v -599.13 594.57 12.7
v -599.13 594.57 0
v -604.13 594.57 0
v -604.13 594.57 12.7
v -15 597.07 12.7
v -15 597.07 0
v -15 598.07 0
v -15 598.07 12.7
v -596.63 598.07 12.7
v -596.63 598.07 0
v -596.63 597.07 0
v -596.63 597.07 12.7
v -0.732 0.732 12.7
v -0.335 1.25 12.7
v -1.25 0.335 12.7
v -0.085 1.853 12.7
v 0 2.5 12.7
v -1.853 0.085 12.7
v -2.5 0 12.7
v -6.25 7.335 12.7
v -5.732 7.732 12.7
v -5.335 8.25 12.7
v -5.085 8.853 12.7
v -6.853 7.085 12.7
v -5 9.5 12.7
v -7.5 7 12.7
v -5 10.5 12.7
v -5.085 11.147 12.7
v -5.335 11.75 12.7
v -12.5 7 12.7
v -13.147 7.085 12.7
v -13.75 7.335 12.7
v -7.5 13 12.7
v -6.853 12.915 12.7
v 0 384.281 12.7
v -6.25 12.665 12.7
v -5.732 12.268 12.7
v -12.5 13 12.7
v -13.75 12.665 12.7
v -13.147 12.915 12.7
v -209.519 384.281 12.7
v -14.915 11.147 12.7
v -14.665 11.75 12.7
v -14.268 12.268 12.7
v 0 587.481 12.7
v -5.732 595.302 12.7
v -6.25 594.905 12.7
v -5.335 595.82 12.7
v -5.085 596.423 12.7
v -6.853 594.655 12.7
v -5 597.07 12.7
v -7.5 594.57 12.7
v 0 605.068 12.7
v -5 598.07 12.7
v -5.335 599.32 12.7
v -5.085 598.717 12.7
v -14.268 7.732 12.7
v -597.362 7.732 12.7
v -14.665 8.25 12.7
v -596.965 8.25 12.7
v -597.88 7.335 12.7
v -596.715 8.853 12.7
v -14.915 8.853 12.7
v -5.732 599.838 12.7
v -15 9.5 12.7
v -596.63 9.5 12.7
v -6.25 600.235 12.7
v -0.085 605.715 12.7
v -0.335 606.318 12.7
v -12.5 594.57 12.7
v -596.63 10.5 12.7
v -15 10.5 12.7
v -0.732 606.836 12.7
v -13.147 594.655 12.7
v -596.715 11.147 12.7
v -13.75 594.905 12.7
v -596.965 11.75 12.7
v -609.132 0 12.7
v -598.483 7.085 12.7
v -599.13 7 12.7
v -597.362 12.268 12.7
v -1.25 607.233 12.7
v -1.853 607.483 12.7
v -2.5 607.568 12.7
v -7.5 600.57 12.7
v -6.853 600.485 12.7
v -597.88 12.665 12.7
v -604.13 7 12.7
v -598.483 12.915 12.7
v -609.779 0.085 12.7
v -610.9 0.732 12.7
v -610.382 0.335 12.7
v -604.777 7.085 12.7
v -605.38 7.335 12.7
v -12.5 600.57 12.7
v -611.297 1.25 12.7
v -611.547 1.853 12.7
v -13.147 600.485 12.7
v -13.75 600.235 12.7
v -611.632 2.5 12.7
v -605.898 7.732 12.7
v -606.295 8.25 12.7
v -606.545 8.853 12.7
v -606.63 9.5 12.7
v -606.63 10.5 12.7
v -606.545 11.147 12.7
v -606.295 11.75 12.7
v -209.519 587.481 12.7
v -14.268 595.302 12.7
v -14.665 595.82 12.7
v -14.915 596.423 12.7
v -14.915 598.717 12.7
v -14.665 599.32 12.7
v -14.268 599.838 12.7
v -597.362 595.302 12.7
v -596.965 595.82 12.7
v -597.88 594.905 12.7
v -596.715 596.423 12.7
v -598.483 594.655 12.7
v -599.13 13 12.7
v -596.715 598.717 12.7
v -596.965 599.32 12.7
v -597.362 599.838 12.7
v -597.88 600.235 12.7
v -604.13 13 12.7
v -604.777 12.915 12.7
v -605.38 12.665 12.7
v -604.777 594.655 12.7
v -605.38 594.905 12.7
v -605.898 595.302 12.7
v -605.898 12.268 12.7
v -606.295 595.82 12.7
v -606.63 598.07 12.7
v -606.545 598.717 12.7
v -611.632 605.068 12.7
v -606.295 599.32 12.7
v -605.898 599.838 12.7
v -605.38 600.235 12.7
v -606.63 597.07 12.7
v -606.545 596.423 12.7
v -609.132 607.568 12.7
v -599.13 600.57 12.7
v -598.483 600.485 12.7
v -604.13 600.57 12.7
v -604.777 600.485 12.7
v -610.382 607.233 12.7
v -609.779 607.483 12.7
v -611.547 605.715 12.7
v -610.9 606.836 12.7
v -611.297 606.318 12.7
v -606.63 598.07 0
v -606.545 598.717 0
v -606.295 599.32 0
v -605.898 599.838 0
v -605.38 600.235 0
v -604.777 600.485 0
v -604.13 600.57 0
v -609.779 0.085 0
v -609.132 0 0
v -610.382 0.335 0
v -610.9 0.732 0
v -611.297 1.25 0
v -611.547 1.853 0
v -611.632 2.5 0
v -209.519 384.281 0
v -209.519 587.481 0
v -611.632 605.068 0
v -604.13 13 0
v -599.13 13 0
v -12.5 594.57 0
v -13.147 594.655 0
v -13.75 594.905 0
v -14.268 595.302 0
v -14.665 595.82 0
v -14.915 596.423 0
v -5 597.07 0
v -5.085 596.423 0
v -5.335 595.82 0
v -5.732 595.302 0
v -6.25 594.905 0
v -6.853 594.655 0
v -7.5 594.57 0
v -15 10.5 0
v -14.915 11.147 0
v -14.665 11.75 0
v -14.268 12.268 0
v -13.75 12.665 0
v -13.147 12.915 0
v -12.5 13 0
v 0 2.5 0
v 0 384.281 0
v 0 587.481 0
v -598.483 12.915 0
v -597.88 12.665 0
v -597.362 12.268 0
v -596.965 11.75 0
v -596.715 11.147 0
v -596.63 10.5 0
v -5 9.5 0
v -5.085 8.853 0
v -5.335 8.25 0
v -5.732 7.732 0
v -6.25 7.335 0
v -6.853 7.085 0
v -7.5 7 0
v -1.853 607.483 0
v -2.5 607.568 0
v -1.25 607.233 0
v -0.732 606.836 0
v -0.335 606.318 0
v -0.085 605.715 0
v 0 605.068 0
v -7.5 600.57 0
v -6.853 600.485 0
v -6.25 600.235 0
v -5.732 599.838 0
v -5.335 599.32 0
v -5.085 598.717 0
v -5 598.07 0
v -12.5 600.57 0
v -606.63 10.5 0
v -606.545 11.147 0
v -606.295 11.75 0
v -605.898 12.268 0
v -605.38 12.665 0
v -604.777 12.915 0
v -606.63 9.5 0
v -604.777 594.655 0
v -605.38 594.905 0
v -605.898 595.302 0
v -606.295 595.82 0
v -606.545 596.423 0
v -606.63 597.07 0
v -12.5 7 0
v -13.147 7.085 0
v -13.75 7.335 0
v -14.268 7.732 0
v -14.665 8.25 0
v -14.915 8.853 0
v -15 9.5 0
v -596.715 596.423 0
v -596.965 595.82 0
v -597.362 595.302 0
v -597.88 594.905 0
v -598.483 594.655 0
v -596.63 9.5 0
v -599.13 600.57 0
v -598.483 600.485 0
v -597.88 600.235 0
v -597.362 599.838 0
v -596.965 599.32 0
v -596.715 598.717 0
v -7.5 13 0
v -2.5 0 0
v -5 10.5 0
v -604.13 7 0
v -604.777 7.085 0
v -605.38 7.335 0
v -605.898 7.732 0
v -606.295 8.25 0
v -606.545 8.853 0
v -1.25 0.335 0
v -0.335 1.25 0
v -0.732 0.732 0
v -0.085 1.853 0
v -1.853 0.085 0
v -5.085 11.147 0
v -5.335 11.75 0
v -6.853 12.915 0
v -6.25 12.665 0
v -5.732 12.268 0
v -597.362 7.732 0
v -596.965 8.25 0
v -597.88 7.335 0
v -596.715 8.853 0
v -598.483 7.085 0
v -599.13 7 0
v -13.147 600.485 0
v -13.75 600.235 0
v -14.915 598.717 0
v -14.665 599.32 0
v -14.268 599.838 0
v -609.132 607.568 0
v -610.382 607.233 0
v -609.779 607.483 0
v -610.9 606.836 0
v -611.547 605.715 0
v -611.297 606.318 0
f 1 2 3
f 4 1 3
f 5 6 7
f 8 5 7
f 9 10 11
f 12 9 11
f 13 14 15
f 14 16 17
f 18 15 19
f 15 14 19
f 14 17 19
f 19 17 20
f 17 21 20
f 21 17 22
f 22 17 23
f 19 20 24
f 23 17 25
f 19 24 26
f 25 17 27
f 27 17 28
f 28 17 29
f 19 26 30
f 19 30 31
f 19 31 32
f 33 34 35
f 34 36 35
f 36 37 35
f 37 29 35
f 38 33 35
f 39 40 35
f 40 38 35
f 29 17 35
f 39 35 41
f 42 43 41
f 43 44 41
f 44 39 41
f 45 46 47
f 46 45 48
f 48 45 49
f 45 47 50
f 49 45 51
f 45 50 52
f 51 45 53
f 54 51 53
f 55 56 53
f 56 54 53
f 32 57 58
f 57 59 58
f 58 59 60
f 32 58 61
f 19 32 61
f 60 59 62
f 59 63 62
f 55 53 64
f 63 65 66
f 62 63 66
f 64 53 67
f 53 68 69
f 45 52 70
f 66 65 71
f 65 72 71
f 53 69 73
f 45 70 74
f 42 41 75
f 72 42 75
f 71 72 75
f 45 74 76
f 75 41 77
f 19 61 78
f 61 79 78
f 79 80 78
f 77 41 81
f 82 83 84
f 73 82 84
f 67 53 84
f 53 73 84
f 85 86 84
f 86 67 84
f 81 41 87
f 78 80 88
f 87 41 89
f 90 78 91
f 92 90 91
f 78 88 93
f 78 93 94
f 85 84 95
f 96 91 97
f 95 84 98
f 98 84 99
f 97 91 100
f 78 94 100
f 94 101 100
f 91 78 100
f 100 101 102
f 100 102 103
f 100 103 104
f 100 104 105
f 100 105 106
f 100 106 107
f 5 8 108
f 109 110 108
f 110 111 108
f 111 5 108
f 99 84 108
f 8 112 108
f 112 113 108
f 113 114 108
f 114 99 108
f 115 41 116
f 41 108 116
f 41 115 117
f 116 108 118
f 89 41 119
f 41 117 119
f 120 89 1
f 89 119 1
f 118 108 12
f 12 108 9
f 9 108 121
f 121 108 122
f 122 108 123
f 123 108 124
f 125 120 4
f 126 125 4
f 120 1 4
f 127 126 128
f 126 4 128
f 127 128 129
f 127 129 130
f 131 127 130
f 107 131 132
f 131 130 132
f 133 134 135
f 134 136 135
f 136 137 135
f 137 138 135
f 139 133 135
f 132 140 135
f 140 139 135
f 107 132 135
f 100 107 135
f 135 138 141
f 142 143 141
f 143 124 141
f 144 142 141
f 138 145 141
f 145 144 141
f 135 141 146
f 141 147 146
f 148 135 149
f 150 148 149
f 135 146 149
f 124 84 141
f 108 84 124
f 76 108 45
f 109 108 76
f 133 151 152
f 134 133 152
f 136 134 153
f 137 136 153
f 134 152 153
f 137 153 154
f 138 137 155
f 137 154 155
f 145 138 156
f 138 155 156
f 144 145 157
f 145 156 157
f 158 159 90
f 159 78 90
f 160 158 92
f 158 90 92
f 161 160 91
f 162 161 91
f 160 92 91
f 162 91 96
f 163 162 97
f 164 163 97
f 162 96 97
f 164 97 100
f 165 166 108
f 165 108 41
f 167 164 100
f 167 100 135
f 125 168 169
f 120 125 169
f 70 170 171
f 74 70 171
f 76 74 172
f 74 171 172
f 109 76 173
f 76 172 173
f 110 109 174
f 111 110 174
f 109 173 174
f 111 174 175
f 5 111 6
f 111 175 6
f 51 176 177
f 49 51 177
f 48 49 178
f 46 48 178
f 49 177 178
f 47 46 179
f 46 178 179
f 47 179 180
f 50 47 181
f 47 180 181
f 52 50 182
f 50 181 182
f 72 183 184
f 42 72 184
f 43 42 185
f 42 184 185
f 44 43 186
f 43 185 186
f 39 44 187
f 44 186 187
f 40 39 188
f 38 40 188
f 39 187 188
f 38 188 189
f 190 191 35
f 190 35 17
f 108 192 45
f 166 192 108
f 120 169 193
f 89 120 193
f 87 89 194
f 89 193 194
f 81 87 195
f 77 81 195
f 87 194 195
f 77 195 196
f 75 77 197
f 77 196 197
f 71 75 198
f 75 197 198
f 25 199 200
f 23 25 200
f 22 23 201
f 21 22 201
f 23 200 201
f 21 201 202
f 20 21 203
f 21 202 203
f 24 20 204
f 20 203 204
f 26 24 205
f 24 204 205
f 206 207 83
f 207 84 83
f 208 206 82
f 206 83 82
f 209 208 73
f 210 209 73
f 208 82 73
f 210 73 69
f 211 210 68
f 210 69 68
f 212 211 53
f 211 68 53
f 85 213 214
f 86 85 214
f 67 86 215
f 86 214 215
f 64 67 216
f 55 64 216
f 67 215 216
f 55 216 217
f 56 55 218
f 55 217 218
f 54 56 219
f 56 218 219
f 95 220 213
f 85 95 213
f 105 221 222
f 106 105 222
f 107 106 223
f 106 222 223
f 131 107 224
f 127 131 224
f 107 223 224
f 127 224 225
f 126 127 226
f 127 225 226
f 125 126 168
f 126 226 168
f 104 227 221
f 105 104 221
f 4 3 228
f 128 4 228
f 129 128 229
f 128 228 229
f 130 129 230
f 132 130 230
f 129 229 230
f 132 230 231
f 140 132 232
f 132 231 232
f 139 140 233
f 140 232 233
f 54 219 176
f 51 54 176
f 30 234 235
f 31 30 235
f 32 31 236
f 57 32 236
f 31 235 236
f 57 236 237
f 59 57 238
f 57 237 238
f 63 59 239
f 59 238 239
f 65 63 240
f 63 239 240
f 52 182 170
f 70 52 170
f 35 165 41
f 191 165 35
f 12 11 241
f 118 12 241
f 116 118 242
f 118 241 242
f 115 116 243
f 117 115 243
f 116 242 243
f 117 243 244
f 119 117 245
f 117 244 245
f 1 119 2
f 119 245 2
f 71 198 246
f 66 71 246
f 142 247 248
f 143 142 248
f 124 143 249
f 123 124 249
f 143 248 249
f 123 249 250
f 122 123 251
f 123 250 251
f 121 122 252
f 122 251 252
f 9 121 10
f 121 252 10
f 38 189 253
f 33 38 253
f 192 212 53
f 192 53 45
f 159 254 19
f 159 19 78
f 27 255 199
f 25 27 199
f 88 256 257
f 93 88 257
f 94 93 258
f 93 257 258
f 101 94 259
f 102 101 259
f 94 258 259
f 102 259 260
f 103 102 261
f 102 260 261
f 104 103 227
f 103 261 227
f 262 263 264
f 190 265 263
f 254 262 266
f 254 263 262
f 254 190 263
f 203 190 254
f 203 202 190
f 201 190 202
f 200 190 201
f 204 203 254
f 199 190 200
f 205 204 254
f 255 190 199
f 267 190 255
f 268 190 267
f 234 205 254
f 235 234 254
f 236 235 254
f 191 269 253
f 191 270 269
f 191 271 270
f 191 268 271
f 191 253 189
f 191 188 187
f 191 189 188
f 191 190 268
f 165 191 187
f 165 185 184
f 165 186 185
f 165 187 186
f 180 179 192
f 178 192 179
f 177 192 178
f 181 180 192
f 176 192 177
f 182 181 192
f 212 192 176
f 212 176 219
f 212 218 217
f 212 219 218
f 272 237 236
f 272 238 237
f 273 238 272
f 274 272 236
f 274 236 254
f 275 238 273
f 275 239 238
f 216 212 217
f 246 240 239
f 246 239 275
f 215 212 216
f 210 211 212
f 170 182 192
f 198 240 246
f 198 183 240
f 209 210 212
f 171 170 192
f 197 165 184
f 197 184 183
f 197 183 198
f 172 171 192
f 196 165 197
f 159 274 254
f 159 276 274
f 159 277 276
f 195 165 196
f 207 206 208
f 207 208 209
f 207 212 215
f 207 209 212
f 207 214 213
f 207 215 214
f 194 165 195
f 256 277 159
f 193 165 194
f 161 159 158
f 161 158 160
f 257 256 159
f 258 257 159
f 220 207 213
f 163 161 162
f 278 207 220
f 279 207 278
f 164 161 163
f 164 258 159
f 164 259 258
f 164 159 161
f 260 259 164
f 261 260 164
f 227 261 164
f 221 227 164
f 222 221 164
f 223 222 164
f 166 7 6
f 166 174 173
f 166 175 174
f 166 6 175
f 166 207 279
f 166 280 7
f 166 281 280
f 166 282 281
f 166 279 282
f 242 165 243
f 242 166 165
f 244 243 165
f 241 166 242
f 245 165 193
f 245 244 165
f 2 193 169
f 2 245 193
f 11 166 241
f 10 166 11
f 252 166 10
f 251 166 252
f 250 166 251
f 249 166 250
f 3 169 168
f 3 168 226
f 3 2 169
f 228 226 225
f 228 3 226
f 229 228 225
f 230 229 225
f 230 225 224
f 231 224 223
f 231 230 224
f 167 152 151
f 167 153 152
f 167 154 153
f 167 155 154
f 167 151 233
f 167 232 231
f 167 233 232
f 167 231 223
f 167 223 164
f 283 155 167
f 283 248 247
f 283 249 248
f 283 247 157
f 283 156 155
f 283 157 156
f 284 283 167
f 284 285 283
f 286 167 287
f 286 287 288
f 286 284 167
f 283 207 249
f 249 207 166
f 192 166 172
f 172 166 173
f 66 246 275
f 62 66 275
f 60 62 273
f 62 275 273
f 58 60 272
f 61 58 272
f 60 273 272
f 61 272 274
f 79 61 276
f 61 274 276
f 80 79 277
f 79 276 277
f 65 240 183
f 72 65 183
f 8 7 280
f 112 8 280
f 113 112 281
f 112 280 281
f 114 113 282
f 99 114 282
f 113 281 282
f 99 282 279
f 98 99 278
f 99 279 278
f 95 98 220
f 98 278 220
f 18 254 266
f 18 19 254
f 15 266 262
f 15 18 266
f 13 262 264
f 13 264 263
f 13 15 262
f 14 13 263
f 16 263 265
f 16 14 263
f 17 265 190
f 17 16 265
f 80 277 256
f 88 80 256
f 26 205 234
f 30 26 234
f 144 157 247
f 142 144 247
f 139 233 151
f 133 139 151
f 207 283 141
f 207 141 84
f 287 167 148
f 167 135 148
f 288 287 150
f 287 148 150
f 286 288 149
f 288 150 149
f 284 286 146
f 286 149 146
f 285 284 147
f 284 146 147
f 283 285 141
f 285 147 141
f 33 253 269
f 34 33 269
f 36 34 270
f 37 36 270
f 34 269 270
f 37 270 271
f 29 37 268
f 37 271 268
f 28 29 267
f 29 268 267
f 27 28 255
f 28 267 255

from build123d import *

# Parameters (mm, degrees)
BOSS_EXTRUDE2_DEPTH = 12.7
FILLET2_R           = 2.5


with BuildPart() as part:
    # Sketch1 → Boss-Extrude2 (new body)
    with BuildSketch(Plane.XY):
        Polygon((0, 0), (-611.632, 0), (-611.632, 607.568), (0, 607.568), (0, 587.480907233), (-209.519092864, 587.480907233), (-209.519092864, 384.280907233), (0, 384.280907233), align=None)
        with BuildLine():
            Line((-5, 10.5), (-5, 9.5))
            ThreePointArc((-5, 9.5), (-5.732233047, 7.732233047), (-7.5, 7))
            Line((-7.5, 7), (-12.5, 7))
            ThreePointArc((-12.5, 7), (-14.267766953, 7.732233047), (-15, 9.5))
            Line((-15, 9.5), (-15, 10.5))
            ThreePointArc((-15, 10.5), (-14.267766953, 12.267766953), (-12.5, 13))
            Line((-12.5, 13), (-7.5, 13))
            ThreePointArc((-7.5, 13), (-5.732233047, 12.267766953), (-5, 10.5))
        make_face(mode=Mode.SUBTRACT)
        with BuildLine():
            Line((-596.63, 10.5), (-596.63, 9.5))
            ThreePointArc((-596.63, 9.5), (-597.362233047, 7.732233047), (-599.13, 7))
            Line((-599.13, 7), (-604.13, 7))
            ThreePointArc((-604.13, 7), (-605.897766953, 7.732233047), (-606.63, 9.5))
            Line((-606.63, 9.5), (-606.63, 10.5))
            ThreePointArc((-606.63, 10.5), (-605.897766953, 12.267766953), (-604.13, 13))
            Line((-604.13, 13), (-599.13, 13))
            ThreePointArc((-599.13, 13), (-597.362233047, 12.267766953), (-596.63, 10.5))
        make_face(mode=Mode.SUBTRACT)
        with BuildLine():
            Line((-596.63, 598.07), (-596.63, 597.07))
            ThreePointArc((-596.63, 597.07), (-597.362233047, 595.302233047), (-599.13, 594.57))
            Line((-599.13, 594.57), (-604.13, 594.57))
            ThreePointArc((-604.13, 594.57), (-605.897766953, 595.302233047), (-606.63, 597.07))
            Line((-606.63, 597.07), (-606.63, 598.07))
            ThreePointArc((-606.63, 598.07), (-605.897766953, 599.837766953), (-604.13, 600.57))
            Line((-604.13, 600.57), (-599.13, 600.57))
            ThreePointArc((-599.13, 600.57), (-597.362233047, 599.837766953), (-596.63, 598.07))
        make_face(mode=Mode.SUBTRACT)
        with BuildLine():
            Line((-5, 598.07), (-5, 597.07))
            ThreePointArc((-5, 597.07), (-5.732233047, 595.302233047), (-7.5, 594.57))
            Line((-7.5, 594.57), (-12.5, 594.57))
            ThreePointArc((-12.5, 594.57), (-14.267766953, 595.302233047), (-15, 597.07))
            Line((-15, 597.07), (-15, 598.07))
            ThreePointArc((-15, 598.07), (-14.267766953, 599.837766953), (-12.5, 600.57))
            Line((-12.5, 600.57), (-7.5, 600.57))
            ThreePointArc((-7.5, 600.57), (-5.732233047, 599.837766953), (-5, 598.07))
        make_face(mode=Mode.SUBTRACT)
    extrude(amount=BOSS_EXTRUDE2_DEPTH)

    # Fillet2
    fillet2_edges = [part.edges().sort_by_distance(p)[0] for p in [
        (0, 0, 6.35),
        (-611.632, 0, 6.35),
        (-611.632, 607.568, 6.35),
        (0, 607.568, 6.35),
    ]]
    fillet(fillet2_edges, radius=FILLET2_R)


solid = part.part
